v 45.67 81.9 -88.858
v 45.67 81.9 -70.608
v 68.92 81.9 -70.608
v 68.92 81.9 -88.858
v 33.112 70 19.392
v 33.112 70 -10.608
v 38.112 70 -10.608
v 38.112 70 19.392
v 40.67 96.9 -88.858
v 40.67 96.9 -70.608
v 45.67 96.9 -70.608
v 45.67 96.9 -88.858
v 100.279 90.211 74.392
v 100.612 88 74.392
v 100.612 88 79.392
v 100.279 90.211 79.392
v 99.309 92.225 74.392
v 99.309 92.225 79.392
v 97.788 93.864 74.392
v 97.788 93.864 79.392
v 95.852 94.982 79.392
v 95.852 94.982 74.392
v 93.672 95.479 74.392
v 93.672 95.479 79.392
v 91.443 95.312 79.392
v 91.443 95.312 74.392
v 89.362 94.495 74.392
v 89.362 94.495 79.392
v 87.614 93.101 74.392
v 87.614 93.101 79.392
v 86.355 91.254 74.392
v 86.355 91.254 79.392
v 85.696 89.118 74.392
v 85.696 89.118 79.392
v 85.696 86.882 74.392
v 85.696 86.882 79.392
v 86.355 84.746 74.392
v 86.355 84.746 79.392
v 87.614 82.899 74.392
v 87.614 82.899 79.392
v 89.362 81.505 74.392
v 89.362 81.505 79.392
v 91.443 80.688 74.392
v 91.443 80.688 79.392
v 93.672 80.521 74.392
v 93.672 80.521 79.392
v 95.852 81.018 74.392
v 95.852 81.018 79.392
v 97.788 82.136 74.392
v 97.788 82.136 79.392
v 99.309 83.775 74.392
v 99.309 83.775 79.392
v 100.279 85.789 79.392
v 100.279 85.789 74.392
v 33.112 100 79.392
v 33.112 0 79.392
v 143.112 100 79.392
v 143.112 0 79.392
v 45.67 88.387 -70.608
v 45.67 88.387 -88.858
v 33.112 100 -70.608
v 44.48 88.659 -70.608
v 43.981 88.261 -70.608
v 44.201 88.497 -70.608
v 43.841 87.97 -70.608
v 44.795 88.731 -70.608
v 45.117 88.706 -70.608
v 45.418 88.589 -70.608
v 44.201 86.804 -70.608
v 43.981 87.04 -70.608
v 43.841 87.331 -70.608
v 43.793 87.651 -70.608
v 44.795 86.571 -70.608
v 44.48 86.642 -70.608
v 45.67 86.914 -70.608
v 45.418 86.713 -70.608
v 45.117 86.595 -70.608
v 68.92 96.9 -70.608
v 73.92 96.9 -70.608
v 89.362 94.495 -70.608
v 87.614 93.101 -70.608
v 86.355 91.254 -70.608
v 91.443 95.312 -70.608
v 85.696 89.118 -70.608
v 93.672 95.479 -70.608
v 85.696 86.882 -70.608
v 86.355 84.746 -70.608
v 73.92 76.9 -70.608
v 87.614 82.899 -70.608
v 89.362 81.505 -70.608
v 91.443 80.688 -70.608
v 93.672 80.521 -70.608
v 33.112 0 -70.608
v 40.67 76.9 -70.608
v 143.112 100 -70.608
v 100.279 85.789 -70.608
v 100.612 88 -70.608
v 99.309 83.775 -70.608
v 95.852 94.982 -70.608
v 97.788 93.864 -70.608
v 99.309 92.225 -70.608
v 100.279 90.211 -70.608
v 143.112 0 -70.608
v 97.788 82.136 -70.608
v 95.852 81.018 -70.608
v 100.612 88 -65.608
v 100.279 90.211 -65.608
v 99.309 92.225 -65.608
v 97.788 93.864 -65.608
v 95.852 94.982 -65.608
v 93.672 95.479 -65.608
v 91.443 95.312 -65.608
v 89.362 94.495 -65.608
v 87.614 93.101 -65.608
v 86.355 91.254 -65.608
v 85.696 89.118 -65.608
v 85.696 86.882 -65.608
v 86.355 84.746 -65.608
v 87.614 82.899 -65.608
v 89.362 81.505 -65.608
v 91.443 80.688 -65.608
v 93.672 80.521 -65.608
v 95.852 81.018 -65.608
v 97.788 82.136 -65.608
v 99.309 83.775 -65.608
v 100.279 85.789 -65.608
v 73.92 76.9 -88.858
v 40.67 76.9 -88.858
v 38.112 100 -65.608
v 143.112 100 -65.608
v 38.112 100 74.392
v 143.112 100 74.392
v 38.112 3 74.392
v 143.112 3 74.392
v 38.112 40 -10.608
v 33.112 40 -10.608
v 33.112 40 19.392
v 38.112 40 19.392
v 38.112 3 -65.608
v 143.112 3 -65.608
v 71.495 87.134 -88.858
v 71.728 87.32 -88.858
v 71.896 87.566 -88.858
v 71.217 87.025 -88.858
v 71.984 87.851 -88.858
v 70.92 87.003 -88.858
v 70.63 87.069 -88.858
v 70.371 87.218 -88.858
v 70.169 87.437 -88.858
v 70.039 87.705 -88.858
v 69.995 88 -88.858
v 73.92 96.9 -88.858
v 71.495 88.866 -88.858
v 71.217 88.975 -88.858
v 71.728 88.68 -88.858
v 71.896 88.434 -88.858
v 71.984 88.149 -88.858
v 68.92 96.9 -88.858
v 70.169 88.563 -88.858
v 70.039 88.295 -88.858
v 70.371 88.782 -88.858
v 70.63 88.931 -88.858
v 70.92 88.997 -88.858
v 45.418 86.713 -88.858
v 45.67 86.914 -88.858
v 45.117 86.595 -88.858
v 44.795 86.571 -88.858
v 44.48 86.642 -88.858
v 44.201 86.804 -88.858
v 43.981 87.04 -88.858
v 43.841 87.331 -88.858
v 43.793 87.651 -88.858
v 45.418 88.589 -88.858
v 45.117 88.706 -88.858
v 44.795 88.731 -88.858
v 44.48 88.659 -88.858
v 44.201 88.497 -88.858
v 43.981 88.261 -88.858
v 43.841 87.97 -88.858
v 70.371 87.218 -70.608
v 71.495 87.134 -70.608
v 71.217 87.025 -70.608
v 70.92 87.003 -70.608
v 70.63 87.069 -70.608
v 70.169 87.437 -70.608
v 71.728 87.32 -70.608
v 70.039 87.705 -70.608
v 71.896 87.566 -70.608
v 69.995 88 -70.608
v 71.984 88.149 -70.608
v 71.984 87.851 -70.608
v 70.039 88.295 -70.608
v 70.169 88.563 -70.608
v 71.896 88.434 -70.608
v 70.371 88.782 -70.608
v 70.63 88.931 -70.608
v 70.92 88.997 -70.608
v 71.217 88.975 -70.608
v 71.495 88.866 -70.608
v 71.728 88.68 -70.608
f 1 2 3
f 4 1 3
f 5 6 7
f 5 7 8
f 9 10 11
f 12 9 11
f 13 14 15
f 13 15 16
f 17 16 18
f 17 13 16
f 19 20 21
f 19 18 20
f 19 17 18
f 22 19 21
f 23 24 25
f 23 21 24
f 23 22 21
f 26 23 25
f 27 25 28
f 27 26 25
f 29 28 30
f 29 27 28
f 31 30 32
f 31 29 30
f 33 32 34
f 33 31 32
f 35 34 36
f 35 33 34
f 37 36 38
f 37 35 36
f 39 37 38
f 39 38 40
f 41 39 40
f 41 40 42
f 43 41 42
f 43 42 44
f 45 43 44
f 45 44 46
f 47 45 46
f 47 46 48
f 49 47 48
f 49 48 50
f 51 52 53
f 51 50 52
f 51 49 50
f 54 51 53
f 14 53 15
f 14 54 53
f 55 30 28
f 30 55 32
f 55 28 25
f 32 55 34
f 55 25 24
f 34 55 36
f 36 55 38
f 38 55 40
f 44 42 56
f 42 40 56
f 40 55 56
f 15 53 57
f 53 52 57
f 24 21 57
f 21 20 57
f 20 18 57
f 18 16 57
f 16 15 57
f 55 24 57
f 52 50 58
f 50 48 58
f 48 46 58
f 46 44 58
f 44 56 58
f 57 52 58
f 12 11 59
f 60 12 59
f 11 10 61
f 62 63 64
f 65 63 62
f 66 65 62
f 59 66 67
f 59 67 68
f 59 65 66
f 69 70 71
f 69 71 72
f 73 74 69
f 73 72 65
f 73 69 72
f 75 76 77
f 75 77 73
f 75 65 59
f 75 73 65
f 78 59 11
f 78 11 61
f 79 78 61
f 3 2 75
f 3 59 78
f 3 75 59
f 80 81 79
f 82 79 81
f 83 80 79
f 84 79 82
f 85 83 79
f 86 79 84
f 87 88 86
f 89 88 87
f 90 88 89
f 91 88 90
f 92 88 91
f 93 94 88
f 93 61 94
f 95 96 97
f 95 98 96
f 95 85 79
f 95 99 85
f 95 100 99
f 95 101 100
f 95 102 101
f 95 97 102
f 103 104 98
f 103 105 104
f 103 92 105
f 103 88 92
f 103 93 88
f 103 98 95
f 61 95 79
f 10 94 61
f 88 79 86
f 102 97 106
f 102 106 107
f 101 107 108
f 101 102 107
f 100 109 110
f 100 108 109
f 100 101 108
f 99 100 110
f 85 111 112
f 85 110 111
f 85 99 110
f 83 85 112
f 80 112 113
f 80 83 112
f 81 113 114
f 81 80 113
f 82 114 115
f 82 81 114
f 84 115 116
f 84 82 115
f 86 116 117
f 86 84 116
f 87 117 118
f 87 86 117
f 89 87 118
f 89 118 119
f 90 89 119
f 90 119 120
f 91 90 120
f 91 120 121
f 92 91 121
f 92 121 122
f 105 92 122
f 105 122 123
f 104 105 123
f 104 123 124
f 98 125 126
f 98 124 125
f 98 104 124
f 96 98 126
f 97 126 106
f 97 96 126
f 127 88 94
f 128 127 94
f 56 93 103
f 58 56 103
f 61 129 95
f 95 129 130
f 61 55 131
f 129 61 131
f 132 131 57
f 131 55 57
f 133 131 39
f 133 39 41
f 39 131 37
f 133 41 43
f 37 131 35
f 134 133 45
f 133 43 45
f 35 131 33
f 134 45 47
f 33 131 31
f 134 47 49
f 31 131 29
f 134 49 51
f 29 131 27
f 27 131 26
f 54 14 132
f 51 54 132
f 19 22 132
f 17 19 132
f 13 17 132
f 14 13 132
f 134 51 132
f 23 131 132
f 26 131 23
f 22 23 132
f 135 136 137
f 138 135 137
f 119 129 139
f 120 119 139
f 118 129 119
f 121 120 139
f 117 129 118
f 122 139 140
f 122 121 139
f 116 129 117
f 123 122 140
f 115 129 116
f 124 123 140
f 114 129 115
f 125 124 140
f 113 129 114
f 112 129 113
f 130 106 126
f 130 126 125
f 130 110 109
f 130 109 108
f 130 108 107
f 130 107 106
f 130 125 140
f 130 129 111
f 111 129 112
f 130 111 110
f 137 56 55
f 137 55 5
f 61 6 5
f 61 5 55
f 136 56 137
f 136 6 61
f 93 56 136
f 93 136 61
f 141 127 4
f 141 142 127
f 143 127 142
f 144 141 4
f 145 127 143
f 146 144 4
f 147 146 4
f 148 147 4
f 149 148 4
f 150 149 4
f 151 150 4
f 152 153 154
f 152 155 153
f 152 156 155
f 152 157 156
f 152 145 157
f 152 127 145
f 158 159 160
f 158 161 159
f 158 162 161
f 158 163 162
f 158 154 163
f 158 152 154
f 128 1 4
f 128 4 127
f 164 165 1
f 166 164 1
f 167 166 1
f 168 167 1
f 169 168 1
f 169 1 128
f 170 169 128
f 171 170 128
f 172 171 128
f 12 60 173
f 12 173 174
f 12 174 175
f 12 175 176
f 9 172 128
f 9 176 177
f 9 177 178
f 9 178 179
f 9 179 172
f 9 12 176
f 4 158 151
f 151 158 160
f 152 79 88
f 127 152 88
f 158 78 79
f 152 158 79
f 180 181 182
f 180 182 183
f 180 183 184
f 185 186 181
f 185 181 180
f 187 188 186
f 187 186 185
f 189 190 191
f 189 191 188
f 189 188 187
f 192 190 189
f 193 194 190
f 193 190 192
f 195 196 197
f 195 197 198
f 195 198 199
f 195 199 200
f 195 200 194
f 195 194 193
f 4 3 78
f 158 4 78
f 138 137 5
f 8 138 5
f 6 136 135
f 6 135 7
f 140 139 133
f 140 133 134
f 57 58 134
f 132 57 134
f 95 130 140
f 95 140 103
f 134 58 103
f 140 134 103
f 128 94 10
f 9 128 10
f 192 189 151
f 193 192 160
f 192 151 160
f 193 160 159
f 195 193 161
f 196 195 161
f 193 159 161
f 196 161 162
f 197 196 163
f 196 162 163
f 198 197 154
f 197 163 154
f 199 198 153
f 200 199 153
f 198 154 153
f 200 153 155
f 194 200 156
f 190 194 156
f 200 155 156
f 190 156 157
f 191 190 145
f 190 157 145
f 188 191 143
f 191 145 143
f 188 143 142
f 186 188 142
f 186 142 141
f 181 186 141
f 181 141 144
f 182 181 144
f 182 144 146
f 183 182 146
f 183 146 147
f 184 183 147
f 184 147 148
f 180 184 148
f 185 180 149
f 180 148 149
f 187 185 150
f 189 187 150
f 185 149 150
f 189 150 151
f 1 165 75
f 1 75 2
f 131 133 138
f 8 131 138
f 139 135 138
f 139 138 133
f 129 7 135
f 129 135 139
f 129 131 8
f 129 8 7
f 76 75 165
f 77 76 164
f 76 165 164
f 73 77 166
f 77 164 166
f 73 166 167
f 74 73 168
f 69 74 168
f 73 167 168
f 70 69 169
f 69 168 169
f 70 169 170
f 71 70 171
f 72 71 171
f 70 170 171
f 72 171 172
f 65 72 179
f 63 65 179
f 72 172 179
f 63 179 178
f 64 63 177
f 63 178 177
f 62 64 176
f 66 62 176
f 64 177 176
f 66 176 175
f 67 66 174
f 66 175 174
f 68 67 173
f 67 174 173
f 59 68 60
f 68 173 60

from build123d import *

# Parameters (mm, degrees)
COLLECTORSIZE_W         = 110
COLLECTORSIZE_H         = 150
BOSS_EXTRUDE1_DEPTH     = 200
COLLECTORSHAPE_W        = 110
COLLECTORSHAPE_H        = 100
CUT_EXTRUDE1_DEPTH      = 289.064276605
COLLECTORWALLS_W        = 129.645083566
COLLECTORWALLS_H        = 140
CUT_EXTRUDE2_DEPTH      = 97
CUT_EXTRUDE5_DEPTH      = 231.176079244
CUT_EXTRUDE5_DEPTH_BACK = 231.176079244
SKETCH1_R               = 7.5
BOSS_EXTRUDE3_DEPTH     = 18.25
SKETCH4_R               = 1.083059031
SKETCH4_R_2             = 1
CUT_EXTRUDE6_DEPTH      = 18.25
SKETCH2_2_W             = 30
SKETCH2_2_H             = 30
CUT_EXTRUDE7_DEPTH      = 10


with BuildPart() as part:
    # CollectorSize → Boss-Extrude1 (new body)
    with BuildSketch(Plane(origin=(0, 0, 0), x_dir=(1, 0, 0), z_dir=(0, 1, 0))):
        with Locations((88.111940299, -4.391791045)):
            Rectangle(COLLECTORSIZE_W, COLLECTORSIZE_H)
    extrude(amount=BOSS_EXTRUDE1_DEPTH)

    # CollectorShape → Cut-Extrude1 (cut, through all)
    with BuildSketch(Plane.XY.offset(79.391791045)):
        with Locations((88.111940299, 150)):
            Rectangle(COLLECTORSHAPE_W, COLLECTORSHAPE_H)
    extrude(amount=-CUT_EXTRUDE1_DEPTH, mode=Mode.SUBTRACT)

    # CollectorWalls → Cut-Extrude2 (cut)
    with BuildSketch(Plane(origin=(0, 100, 0), x_dir=(1, 0, 0), z_dir=(0, 1, 0))):
        with Locations((102.934482082, -4.391791045)):
            Rectangle(COLLECTORWALLS_W, COLLECTORWALLS_H)
    extrude(amount=-CUT_EXTRUDE2_DEPTH, mode=Mode.SUBTRACT)

    # Sketch1 → Cut-Extrude5 (cut, two sides: drawn at the far end of the back side and taken through both)
    with BuildSketch(Plane.XY.offset(79.391791045).offset(-CUT_EXTRUDE5_DEPTH_BACK)):
        with Locations((93.111940299, 88)):
            Circle(SKETCH1_R)
    extrude(amount=CUT_EXTRUDE5_DEPTH + CUT_EXTRUDE5_DEPTH_BACK, mode=Mode.SUBTRACT)

    # Sketch3 → Boss-Extrude3 (add)
    with BuildSketch(Plane(origin=(0, 0, -70.608208955), x_dir=(-1, 0, 0), z_dir=(0, 0, -1))):
        Polygon((-45.669947857, 81.9), (-68.919947857, 81.9), (-68.919947857, 96.9), (-73.919947857, 96.9), (-73.919947857, 76.9), (-40.669947857, 76.9), (-40.669947857, 96.9), (-45.669947857, 96.9), align=None)
    extrude(amount=BOSS_EXTRUDE3_DEPTH)

    # Sketch4 → Cut-Extrude6 (cut)
    with BuildSketch(Plane(origin=(0, 0, -88.858208955), x_dir=(-1, 0, 0), z_dir=(0, 0, -1))):
        with Locations((-44.876021334, 87.650563986)):
            Circle(SKETCH4_R)
        with Locations((-70.994947857, 88)):
            Circle(SKETCH4_R_2)
    extrude(amount=-CUT_EXTRUDE6_DEPTH, mode=Mode.SUBTRACT)

    # Sketch2<2> → Cut-Extrude7 (cut)
    with BuildSketch(Plane.ZY.offset(-33.111940299)):
        with Locations((4.391791045, 55)):
            Rectangle(SKETCH2_2_W, SKETCH2_2_H)
    extrude(amount=-CUT_EXTRUDE7_DEPTH, mode=Mode.SUBTRACT)


solid = part.part
